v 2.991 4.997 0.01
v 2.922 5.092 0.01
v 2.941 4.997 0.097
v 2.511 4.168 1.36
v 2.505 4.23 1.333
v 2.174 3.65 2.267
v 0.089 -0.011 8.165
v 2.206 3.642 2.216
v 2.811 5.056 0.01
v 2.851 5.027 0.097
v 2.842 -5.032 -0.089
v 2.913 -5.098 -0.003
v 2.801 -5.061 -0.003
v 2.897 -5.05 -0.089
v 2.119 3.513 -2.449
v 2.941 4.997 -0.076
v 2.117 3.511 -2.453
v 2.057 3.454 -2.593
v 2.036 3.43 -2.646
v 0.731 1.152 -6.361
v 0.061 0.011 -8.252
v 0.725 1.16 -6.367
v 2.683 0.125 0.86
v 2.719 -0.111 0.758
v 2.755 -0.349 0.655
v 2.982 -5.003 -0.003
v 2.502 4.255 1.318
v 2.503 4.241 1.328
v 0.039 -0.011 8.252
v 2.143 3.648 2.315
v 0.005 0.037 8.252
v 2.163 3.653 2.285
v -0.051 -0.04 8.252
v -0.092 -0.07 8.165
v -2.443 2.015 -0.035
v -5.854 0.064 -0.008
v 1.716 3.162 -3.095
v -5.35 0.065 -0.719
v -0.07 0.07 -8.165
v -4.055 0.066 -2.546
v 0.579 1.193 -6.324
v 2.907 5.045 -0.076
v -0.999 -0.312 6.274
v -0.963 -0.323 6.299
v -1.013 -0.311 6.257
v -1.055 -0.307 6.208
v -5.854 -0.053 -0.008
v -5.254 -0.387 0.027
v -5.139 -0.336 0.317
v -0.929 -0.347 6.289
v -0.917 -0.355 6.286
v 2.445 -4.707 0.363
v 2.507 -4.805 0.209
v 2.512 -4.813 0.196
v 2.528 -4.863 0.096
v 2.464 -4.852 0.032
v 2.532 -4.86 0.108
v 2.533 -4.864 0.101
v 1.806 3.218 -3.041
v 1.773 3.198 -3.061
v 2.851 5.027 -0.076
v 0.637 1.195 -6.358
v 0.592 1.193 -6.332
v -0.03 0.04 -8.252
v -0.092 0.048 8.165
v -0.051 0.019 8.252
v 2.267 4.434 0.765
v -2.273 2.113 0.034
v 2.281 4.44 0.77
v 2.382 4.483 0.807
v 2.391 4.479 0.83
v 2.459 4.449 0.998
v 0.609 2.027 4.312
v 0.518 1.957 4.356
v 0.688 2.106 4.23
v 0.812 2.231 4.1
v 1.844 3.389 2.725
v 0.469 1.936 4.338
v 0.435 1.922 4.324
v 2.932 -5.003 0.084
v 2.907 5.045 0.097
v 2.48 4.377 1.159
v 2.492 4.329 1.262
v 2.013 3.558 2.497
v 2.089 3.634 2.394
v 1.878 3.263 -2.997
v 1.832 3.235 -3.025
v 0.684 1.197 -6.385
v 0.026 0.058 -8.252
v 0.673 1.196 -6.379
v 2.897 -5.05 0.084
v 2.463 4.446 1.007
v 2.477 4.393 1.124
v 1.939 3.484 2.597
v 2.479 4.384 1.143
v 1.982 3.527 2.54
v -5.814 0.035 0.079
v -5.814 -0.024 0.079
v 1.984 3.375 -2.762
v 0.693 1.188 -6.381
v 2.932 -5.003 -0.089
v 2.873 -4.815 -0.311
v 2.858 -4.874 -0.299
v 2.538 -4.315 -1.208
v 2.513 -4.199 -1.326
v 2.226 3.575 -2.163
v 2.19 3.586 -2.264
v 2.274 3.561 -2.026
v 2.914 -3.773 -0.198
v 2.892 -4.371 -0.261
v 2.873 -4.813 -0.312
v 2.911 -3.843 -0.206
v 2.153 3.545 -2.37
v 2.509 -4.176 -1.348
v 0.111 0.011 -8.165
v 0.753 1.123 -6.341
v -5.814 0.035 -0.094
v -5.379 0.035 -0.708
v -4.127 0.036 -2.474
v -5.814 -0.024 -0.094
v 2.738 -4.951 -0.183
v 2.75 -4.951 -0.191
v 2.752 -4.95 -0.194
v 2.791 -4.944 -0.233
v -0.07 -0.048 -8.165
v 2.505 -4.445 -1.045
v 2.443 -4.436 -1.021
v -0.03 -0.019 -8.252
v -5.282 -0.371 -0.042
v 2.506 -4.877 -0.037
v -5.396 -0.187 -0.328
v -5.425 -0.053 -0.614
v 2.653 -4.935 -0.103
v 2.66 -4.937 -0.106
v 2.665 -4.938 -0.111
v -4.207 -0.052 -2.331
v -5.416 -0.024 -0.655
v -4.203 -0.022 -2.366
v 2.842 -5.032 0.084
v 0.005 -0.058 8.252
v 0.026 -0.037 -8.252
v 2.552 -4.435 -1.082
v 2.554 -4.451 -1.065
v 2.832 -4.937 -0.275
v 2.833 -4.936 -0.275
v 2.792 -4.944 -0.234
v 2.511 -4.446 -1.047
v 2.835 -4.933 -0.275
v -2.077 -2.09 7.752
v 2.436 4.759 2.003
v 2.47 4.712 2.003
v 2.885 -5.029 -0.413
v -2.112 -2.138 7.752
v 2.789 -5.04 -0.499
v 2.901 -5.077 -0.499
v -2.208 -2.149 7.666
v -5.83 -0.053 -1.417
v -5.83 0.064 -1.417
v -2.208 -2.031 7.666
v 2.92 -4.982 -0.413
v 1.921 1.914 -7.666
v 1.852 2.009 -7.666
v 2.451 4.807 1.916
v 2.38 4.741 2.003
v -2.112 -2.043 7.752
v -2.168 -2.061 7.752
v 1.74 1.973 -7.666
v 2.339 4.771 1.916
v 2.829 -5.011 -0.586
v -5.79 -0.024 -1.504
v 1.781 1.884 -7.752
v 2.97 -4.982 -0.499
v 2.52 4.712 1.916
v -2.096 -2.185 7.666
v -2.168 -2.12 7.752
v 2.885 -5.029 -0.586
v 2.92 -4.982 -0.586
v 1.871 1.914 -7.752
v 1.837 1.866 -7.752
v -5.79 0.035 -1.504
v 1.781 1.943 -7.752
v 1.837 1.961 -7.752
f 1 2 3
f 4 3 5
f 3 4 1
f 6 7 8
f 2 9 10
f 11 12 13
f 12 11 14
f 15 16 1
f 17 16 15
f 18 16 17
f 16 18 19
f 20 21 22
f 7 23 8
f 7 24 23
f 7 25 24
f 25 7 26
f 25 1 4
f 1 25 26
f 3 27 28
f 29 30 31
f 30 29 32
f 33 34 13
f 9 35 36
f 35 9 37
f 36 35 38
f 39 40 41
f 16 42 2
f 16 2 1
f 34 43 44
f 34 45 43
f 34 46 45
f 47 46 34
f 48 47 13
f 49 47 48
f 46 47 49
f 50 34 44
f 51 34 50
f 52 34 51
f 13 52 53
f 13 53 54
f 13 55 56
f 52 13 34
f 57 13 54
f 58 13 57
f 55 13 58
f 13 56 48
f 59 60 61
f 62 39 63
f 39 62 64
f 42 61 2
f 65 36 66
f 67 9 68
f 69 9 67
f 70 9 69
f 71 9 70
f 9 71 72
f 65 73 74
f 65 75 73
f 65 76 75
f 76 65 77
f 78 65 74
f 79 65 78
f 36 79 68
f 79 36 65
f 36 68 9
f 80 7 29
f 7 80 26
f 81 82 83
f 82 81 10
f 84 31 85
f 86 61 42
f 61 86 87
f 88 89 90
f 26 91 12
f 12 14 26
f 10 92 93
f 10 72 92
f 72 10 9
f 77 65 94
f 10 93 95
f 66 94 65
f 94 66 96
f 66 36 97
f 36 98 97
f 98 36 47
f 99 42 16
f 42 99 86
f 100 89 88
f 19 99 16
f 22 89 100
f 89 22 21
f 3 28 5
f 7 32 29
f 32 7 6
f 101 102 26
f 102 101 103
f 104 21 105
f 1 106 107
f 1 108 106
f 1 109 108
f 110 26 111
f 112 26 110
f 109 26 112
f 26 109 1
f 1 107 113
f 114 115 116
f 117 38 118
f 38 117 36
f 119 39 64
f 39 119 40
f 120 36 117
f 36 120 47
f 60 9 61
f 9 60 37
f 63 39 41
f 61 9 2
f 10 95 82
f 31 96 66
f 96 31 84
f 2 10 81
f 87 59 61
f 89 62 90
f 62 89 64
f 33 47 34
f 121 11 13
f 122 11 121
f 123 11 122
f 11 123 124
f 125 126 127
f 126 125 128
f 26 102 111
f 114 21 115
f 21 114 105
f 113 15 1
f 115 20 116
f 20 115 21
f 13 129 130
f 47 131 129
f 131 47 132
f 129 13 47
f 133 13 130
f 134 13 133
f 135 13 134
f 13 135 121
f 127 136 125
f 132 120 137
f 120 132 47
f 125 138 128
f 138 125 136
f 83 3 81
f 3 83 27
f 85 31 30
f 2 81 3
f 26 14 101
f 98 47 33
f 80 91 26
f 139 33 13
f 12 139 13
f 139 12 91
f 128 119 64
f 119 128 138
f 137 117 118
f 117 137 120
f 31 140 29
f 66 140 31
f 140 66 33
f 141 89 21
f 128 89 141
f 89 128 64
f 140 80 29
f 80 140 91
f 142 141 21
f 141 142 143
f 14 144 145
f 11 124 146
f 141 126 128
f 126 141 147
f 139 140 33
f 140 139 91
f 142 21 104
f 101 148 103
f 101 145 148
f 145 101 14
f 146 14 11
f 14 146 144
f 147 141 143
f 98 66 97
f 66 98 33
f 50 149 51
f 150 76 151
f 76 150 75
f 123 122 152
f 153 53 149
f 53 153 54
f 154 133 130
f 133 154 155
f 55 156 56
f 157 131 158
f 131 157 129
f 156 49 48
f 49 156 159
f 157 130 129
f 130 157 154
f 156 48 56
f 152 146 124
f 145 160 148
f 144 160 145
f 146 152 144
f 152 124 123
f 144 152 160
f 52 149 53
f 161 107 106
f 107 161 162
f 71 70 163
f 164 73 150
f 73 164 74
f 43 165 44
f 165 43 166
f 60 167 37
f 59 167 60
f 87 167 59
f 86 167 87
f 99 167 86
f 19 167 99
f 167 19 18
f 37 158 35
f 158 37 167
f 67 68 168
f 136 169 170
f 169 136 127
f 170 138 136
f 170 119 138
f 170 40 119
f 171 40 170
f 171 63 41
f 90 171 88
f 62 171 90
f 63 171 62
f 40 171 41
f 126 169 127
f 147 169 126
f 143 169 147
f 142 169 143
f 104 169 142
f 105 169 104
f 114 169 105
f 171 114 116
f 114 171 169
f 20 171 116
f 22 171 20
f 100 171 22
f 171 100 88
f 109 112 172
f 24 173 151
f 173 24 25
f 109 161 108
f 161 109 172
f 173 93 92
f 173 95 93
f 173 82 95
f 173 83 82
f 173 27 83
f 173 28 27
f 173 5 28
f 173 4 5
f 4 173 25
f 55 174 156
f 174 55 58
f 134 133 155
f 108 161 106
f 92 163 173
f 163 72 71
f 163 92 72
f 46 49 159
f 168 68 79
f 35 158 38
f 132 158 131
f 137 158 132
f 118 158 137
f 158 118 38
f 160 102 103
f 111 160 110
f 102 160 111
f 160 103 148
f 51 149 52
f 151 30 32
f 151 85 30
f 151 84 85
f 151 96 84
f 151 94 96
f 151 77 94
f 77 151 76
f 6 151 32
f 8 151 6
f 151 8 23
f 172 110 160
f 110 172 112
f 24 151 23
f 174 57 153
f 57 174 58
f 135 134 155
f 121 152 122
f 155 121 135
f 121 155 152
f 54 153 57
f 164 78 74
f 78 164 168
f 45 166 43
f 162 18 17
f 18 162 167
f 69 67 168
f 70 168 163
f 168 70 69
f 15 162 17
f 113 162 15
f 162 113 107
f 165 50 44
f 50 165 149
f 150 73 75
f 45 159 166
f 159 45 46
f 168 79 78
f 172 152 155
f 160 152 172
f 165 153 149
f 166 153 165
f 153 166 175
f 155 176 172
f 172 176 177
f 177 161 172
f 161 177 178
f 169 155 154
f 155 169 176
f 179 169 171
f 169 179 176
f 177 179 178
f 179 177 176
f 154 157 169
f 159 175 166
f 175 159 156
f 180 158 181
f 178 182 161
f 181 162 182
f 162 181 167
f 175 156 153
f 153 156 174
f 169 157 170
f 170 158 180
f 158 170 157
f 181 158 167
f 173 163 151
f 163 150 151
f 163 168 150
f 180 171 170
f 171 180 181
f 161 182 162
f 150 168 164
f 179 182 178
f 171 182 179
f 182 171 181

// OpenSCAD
// Auto-generated OpenSCAD file

    inner_points = 10*[[0.1821393068757838, 0.1913870506433806, -0.766553282190714], [-0.21273894850983668, -0.20901536236239762, 0.766553282190714], [-0.5749142746609799, 0.0005416474787896391, -0.14169497283306184], [0.24202588352164686, 0.471177062130277, 0.19163832047015342], [0.2869889286882537, -0.4981611771875922, -0.0499433476370916]];

    outer_points = 10*[[-0.0010710062446377955, -0.001087881755346909, 0.8164951537673552], [0.0010710062446377955, 0.001087881755346909, -0.8164951537673552], [-0.5773495172173777, 0.0005439408776734544, -0.0007565913797176194], [0.2882045658240988, -0.5002713047271171, -0.0002885101452453076], [0.2891449513932788, 0.49972736384944366, 0.001045101524962927]];

    // Convex hull for inner set (I)
    module inner_hull() {
        hull() {
            for (p = inner_points) {
                translate(p) sphere(r=0.1);
            }
        }
    }

    // Convex hull for outer set (O) minus inner hull (O \ I)
    module outer_minus_inner() {
        difference() {
            hull() {
                for (p = outer_points) {
                    translate(p) sphere(r=0.1);
                }
            }
            inner_hull(); // Subtract inner hull
        }
    }

    // Convex hull for outer set (O) minus all translated inner hulls
    module outer_minus_AllTranslationInner() {
        difference() {
            hull() {
                for (p = outer_points) {
                    translate(p) sphere(r=0.1);
                }
            }
            hull() {
                translate([0,0,50]) inner_hull();
                translate([0,0,-50]) inner_hull();
            }; // Subtract translated inner hulls
        }
    }

    // Difference between outer_minus_inner and outer_minus_AllTranslationInner
    module outer_minus_inner_diff() {
        difference() {
            // Outer minus inner
            difference() {
                hull() {
                    for (p = outer_points) {
                        translate(p) sphere(r=0.1);
                    }
                }
                inner_hull();
            }

            // Subtract Outer minus AllTranslationInner
            difference() {
                hull() {
                    for (p = outer_points) {
                        translate(p) sphere(r=0.1);
                    }
                }
                hull() {
                    translate([0,0,50]) inner_hull();
                    translate([0,0,-50]) inner_hull();
                };
            }
        }
    }

    // Rendering all with colors applied
    color([1, 0, 0, 0.5]) inner_hull(); // Transparent red
    color([0, 1, 0, 1]) outer_minus_AllTranslationInner(); // Opaque green
    color([1, 1, 0, 1]) outer_minus_inner_diff(); // Opaque yellow
    
